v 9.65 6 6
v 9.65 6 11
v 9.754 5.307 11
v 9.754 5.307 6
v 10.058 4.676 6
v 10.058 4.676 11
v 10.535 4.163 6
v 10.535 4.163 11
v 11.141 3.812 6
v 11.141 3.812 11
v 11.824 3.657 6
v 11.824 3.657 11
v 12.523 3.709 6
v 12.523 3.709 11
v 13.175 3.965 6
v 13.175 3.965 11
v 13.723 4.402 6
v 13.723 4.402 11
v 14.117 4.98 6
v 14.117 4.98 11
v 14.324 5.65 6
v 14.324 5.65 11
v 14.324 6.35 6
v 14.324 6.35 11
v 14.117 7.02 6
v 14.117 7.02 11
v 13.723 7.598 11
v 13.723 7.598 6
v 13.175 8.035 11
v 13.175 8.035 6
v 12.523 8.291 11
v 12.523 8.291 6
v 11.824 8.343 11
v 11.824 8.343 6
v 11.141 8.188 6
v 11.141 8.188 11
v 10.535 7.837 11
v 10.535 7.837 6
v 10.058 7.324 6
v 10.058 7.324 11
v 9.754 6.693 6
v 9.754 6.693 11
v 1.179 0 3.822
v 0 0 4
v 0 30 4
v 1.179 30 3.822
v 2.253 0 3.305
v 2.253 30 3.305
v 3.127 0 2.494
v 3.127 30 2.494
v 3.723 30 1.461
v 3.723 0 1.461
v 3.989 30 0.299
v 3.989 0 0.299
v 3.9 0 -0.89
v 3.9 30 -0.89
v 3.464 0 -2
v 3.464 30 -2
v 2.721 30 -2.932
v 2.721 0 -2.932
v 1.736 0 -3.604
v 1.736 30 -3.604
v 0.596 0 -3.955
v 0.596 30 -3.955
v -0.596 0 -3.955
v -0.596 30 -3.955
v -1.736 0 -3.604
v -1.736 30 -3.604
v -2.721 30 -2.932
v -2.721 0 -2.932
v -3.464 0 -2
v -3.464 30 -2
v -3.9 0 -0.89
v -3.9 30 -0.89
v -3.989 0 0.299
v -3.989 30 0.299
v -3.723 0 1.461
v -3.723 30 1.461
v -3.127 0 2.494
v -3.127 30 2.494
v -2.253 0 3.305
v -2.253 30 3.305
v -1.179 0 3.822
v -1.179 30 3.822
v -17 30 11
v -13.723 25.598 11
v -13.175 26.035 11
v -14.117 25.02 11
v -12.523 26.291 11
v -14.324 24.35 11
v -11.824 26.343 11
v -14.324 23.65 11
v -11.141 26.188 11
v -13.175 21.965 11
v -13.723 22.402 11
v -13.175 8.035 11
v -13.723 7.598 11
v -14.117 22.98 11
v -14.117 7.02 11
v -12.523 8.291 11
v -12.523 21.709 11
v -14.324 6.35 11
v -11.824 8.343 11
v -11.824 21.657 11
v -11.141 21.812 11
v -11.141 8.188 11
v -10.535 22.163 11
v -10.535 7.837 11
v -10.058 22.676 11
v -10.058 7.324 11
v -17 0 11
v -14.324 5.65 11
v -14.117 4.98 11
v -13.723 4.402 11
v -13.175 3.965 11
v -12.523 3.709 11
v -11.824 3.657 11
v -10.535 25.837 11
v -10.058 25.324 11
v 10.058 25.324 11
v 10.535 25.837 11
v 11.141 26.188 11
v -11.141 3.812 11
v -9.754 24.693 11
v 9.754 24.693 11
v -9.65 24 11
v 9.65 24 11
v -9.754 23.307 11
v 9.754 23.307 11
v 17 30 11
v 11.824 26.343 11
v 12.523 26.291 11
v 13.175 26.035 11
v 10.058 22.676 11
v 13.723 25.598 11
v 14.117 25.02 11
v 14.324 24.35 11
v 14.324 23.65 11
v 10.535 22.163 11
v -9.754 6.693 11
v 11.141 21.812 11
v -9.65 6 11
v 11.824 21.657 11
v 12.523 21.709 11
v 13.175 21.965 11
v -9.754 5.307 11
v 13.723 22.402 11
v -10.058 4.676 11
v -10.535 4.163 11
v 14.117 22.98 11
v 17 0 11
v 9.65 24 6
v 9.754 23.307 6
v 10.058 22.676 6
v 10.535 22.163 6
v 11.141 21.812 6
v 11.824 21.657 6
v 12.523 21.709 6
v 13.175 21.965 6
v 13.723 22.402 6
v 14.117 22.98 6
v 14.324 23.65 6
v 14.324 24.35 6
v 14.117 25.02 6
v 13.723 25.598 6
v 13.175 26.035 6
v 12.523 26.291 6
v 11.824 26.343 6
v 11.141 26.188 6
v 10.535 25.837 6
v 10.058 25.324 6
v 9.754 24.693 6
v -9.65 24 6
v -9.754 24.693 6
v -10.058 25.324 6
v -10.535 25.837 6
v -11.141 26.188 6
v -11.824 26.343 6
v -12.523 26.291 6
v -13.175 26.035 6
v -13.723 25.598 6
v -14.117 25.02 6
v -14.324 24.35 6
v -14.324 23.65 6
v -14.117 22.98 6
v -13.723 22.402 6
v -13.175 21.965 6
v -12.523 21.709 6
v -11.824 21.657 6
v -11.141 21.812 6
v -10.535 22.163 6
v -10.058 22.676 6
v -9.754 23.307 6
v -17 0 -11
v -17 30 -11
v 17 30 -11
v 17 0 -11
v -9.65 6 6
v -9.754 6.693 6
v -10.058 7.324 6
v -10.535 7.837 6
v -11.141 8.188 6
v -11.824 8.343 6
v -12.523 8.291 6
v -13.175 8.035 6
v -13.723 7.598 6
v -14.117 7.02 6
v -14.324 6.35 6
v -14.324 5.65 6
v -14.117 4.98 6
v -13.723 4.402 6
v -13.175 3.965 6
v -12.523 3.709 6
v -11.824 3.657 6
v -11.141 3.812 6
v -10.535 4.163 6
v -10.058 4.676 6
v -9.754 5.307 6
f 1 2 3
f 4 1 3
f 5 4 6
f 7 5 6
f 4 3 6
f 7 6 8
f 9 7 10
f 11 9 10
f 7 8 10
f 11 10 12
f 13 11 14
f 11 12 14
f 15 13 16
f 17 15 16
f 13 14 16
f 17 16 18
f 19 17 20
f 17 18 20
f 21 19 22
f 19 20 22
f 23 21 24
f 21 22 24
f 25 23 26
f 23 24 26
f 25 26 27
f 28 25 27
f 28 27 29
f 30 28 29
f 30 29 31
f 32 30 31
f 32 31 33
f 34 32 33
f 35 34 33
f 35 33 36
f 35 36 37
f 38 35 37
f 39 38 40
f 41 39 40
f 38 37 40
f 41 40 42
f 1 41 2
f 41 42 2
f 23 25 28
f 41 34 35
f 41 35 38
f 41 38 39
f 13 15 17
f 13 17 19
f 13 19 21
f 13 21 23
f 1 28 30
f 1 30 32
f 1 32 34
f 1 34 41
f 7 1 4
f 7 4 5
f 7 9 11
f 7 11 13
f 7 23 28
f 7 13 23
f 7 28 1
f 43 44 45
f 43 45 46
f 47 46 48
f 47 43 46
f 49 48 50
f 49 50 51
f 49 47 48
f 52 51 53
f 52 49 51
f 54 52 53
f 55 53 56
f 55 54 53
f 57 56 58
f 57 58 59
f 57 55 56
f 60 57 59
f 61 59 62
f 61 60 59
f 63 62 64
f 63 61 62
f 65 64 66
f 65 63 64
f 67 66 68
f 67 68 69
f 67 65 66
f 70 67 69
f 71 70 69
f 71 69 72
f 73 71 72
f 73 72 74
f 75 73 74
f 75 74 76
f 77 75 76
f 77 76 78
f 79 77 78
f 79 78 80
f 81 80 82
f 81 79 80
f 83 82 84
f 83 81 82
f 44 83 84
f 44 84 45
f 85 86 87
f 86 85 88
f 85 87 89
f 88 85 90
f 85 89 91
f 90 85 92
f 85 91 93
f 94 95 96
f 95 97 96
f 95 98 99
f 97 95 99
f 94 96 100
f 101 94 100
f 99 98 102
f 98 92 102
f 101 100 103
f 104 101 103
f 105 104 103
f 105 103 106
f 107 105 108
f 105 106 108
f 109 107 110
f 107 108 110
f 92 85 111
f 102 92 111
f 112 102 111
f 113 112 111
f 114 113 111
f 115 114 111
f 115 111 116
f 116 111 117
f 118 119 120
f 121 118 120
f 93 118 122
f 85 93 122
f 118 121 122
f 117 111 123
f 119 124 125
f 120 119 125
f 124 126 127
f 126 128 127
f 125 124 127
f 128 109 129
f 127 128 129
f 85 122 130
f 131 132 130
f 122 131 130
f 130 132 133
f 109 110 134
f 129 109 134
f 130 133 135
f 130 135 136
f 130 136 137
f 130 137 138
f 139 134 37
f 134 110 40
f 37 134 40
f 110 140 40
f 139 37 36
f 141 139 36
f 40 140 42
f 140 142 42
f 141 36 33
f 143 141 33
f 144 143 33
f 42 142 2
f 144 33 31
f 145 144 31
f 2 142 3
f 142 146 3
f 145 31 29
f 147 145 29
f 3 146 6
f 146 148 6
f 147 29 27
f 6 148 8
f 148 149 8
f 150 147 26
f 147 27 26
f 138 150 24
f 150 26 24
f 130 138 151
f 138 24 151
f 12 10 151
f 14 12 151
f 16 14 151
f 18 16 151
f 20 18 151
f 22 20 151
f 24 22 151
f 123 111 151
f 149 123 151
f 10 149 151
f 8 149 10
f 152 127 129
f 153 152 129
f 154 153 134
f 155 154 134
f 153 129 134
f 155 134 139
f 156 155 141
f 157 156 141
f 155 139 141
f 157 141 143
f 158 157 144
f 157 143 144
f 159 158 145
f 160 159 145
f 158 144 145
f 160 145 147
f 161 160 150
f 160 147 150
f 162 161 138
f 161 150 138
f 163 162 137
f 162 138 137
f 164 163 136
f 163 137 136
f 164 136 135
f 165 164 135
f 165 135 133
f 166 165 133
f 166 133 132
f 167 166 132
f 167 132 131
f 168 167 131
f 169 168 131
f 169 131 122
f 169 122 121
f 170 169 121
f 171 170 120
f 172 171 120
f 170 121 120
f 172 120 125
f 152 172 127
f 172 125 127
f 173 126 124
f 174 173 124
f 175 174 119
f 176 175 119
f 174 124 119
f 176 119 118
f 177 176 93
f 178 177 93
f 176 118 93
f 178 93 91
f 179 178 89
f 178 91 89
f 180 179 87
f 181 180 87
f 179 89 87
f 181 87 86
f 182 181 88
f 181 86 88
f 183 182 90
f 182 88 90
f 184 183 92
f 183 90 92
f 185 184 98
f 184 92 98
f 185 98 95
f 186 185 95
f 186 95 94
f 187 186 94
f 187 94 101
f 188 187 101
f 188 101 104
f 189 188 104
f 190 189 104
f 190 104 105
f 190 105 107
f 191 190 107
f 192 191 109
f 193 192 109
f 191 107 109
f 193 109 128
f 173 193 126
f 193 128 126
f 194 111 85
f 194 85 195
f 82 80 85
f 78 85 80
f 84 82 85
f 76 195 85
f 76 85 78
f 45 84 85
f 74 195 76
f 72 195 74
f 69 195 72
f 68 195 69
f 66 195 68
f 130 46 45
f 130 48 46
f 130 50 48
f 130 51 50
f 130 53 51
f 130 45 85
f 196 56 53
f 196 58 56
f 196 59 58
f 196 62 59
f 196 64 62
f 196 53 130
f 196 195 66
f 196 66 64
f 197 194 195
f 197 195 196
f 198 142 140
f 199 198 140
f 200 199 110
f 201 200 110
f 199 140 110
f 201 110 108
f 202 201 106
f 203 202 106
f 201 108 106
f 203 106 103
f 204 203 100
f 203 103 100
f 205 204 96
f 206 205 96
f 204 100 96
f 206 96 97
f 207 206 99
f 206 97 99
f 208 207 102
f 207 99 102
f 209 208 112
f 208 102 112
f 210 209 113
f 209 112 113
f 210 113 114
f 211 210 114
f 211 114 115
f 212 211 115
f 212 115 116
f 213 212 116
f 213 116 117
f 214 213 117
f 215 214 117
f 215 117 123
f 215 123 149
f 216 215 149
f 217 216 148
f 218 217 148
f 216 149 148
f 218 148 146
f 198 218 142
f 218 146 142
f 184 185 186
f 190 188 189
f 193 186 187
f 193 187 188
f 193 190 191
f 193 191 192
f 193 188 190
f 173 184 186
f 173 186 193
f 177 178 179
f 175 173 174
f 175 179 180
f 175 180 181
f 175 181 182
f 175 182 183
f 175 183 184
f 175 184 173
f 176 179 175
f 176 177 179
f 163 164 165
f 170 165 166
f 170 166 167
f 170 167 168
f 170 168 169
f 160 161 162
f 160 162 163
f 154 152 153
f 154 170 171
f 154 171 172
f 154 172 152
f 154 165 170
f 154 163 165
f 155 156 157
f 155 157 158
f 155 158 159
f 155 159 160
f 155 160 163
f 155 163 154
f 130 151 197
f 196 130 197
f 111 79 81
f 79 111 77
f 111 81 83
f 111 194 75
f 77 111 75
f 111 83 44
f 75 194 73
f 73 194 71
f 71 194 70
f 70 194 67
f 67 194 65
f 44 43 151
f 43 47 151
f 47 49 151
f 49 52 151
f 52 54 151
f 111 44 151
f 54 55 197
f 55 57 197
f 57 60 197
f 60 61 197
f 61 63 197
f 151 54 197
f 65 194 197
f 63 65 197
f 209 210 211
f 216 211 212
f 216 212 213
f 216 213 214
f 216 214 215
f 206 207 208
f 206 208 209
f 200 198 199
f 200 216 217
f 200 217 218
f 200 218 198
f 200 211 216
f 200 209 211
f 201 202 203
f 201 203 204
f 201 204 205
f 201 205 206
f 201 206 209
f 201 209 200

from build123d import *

# Parameters (mm, degrees)
SKETCH1_W           = 34
SKETCH1_H           = 22
SKETCH1_R           = 4
BOSS_EXTRUDE1_DEPTH = 30
SKETCH3_R           = 2.35
CUT_EXTRUDE1_DEPTH  = 5


with BuildPart() as part:
    # Sketch1 → Boss-Extrude1 (new body)
    with BuildSketch(Plane(origin=(0, 0, 0), x_dir=(1, 0, 0), z_dir=(0, 1, 0))):
        Rectangle(SKETCH1_W, SKETCH1_H)
        with Locations(Location((0, 0, 0), (0, 0, 270))):
            Circle(SKETCH1_R, mode=Mode.SUBTRACT)
    extrude(amount=BOSS_EXTRUDE1_DEPTH)

    # Sketch3 → Cut-Extrude1 (cut)
    with BuildSketch(Plane.XY.offset(11)):
        with Locations((-12, 24)):
            Circle(SKETCH3_R)
        with Locations((-12, 6)):
            Circle(SKETCH3_R)
        with Locations(Location((12, 6, 0), (0, 0, 180))):
            Circle(SKETCH3_R)
        with Locations(Location((12, 24, 0), (0, 0, 180))):
            Circle(SKETCH3_R)
    extrude(amount=-CUT_EXTRUDE1_DEPTH, mode=Mode.SUBTRACT)


solid = part.part
